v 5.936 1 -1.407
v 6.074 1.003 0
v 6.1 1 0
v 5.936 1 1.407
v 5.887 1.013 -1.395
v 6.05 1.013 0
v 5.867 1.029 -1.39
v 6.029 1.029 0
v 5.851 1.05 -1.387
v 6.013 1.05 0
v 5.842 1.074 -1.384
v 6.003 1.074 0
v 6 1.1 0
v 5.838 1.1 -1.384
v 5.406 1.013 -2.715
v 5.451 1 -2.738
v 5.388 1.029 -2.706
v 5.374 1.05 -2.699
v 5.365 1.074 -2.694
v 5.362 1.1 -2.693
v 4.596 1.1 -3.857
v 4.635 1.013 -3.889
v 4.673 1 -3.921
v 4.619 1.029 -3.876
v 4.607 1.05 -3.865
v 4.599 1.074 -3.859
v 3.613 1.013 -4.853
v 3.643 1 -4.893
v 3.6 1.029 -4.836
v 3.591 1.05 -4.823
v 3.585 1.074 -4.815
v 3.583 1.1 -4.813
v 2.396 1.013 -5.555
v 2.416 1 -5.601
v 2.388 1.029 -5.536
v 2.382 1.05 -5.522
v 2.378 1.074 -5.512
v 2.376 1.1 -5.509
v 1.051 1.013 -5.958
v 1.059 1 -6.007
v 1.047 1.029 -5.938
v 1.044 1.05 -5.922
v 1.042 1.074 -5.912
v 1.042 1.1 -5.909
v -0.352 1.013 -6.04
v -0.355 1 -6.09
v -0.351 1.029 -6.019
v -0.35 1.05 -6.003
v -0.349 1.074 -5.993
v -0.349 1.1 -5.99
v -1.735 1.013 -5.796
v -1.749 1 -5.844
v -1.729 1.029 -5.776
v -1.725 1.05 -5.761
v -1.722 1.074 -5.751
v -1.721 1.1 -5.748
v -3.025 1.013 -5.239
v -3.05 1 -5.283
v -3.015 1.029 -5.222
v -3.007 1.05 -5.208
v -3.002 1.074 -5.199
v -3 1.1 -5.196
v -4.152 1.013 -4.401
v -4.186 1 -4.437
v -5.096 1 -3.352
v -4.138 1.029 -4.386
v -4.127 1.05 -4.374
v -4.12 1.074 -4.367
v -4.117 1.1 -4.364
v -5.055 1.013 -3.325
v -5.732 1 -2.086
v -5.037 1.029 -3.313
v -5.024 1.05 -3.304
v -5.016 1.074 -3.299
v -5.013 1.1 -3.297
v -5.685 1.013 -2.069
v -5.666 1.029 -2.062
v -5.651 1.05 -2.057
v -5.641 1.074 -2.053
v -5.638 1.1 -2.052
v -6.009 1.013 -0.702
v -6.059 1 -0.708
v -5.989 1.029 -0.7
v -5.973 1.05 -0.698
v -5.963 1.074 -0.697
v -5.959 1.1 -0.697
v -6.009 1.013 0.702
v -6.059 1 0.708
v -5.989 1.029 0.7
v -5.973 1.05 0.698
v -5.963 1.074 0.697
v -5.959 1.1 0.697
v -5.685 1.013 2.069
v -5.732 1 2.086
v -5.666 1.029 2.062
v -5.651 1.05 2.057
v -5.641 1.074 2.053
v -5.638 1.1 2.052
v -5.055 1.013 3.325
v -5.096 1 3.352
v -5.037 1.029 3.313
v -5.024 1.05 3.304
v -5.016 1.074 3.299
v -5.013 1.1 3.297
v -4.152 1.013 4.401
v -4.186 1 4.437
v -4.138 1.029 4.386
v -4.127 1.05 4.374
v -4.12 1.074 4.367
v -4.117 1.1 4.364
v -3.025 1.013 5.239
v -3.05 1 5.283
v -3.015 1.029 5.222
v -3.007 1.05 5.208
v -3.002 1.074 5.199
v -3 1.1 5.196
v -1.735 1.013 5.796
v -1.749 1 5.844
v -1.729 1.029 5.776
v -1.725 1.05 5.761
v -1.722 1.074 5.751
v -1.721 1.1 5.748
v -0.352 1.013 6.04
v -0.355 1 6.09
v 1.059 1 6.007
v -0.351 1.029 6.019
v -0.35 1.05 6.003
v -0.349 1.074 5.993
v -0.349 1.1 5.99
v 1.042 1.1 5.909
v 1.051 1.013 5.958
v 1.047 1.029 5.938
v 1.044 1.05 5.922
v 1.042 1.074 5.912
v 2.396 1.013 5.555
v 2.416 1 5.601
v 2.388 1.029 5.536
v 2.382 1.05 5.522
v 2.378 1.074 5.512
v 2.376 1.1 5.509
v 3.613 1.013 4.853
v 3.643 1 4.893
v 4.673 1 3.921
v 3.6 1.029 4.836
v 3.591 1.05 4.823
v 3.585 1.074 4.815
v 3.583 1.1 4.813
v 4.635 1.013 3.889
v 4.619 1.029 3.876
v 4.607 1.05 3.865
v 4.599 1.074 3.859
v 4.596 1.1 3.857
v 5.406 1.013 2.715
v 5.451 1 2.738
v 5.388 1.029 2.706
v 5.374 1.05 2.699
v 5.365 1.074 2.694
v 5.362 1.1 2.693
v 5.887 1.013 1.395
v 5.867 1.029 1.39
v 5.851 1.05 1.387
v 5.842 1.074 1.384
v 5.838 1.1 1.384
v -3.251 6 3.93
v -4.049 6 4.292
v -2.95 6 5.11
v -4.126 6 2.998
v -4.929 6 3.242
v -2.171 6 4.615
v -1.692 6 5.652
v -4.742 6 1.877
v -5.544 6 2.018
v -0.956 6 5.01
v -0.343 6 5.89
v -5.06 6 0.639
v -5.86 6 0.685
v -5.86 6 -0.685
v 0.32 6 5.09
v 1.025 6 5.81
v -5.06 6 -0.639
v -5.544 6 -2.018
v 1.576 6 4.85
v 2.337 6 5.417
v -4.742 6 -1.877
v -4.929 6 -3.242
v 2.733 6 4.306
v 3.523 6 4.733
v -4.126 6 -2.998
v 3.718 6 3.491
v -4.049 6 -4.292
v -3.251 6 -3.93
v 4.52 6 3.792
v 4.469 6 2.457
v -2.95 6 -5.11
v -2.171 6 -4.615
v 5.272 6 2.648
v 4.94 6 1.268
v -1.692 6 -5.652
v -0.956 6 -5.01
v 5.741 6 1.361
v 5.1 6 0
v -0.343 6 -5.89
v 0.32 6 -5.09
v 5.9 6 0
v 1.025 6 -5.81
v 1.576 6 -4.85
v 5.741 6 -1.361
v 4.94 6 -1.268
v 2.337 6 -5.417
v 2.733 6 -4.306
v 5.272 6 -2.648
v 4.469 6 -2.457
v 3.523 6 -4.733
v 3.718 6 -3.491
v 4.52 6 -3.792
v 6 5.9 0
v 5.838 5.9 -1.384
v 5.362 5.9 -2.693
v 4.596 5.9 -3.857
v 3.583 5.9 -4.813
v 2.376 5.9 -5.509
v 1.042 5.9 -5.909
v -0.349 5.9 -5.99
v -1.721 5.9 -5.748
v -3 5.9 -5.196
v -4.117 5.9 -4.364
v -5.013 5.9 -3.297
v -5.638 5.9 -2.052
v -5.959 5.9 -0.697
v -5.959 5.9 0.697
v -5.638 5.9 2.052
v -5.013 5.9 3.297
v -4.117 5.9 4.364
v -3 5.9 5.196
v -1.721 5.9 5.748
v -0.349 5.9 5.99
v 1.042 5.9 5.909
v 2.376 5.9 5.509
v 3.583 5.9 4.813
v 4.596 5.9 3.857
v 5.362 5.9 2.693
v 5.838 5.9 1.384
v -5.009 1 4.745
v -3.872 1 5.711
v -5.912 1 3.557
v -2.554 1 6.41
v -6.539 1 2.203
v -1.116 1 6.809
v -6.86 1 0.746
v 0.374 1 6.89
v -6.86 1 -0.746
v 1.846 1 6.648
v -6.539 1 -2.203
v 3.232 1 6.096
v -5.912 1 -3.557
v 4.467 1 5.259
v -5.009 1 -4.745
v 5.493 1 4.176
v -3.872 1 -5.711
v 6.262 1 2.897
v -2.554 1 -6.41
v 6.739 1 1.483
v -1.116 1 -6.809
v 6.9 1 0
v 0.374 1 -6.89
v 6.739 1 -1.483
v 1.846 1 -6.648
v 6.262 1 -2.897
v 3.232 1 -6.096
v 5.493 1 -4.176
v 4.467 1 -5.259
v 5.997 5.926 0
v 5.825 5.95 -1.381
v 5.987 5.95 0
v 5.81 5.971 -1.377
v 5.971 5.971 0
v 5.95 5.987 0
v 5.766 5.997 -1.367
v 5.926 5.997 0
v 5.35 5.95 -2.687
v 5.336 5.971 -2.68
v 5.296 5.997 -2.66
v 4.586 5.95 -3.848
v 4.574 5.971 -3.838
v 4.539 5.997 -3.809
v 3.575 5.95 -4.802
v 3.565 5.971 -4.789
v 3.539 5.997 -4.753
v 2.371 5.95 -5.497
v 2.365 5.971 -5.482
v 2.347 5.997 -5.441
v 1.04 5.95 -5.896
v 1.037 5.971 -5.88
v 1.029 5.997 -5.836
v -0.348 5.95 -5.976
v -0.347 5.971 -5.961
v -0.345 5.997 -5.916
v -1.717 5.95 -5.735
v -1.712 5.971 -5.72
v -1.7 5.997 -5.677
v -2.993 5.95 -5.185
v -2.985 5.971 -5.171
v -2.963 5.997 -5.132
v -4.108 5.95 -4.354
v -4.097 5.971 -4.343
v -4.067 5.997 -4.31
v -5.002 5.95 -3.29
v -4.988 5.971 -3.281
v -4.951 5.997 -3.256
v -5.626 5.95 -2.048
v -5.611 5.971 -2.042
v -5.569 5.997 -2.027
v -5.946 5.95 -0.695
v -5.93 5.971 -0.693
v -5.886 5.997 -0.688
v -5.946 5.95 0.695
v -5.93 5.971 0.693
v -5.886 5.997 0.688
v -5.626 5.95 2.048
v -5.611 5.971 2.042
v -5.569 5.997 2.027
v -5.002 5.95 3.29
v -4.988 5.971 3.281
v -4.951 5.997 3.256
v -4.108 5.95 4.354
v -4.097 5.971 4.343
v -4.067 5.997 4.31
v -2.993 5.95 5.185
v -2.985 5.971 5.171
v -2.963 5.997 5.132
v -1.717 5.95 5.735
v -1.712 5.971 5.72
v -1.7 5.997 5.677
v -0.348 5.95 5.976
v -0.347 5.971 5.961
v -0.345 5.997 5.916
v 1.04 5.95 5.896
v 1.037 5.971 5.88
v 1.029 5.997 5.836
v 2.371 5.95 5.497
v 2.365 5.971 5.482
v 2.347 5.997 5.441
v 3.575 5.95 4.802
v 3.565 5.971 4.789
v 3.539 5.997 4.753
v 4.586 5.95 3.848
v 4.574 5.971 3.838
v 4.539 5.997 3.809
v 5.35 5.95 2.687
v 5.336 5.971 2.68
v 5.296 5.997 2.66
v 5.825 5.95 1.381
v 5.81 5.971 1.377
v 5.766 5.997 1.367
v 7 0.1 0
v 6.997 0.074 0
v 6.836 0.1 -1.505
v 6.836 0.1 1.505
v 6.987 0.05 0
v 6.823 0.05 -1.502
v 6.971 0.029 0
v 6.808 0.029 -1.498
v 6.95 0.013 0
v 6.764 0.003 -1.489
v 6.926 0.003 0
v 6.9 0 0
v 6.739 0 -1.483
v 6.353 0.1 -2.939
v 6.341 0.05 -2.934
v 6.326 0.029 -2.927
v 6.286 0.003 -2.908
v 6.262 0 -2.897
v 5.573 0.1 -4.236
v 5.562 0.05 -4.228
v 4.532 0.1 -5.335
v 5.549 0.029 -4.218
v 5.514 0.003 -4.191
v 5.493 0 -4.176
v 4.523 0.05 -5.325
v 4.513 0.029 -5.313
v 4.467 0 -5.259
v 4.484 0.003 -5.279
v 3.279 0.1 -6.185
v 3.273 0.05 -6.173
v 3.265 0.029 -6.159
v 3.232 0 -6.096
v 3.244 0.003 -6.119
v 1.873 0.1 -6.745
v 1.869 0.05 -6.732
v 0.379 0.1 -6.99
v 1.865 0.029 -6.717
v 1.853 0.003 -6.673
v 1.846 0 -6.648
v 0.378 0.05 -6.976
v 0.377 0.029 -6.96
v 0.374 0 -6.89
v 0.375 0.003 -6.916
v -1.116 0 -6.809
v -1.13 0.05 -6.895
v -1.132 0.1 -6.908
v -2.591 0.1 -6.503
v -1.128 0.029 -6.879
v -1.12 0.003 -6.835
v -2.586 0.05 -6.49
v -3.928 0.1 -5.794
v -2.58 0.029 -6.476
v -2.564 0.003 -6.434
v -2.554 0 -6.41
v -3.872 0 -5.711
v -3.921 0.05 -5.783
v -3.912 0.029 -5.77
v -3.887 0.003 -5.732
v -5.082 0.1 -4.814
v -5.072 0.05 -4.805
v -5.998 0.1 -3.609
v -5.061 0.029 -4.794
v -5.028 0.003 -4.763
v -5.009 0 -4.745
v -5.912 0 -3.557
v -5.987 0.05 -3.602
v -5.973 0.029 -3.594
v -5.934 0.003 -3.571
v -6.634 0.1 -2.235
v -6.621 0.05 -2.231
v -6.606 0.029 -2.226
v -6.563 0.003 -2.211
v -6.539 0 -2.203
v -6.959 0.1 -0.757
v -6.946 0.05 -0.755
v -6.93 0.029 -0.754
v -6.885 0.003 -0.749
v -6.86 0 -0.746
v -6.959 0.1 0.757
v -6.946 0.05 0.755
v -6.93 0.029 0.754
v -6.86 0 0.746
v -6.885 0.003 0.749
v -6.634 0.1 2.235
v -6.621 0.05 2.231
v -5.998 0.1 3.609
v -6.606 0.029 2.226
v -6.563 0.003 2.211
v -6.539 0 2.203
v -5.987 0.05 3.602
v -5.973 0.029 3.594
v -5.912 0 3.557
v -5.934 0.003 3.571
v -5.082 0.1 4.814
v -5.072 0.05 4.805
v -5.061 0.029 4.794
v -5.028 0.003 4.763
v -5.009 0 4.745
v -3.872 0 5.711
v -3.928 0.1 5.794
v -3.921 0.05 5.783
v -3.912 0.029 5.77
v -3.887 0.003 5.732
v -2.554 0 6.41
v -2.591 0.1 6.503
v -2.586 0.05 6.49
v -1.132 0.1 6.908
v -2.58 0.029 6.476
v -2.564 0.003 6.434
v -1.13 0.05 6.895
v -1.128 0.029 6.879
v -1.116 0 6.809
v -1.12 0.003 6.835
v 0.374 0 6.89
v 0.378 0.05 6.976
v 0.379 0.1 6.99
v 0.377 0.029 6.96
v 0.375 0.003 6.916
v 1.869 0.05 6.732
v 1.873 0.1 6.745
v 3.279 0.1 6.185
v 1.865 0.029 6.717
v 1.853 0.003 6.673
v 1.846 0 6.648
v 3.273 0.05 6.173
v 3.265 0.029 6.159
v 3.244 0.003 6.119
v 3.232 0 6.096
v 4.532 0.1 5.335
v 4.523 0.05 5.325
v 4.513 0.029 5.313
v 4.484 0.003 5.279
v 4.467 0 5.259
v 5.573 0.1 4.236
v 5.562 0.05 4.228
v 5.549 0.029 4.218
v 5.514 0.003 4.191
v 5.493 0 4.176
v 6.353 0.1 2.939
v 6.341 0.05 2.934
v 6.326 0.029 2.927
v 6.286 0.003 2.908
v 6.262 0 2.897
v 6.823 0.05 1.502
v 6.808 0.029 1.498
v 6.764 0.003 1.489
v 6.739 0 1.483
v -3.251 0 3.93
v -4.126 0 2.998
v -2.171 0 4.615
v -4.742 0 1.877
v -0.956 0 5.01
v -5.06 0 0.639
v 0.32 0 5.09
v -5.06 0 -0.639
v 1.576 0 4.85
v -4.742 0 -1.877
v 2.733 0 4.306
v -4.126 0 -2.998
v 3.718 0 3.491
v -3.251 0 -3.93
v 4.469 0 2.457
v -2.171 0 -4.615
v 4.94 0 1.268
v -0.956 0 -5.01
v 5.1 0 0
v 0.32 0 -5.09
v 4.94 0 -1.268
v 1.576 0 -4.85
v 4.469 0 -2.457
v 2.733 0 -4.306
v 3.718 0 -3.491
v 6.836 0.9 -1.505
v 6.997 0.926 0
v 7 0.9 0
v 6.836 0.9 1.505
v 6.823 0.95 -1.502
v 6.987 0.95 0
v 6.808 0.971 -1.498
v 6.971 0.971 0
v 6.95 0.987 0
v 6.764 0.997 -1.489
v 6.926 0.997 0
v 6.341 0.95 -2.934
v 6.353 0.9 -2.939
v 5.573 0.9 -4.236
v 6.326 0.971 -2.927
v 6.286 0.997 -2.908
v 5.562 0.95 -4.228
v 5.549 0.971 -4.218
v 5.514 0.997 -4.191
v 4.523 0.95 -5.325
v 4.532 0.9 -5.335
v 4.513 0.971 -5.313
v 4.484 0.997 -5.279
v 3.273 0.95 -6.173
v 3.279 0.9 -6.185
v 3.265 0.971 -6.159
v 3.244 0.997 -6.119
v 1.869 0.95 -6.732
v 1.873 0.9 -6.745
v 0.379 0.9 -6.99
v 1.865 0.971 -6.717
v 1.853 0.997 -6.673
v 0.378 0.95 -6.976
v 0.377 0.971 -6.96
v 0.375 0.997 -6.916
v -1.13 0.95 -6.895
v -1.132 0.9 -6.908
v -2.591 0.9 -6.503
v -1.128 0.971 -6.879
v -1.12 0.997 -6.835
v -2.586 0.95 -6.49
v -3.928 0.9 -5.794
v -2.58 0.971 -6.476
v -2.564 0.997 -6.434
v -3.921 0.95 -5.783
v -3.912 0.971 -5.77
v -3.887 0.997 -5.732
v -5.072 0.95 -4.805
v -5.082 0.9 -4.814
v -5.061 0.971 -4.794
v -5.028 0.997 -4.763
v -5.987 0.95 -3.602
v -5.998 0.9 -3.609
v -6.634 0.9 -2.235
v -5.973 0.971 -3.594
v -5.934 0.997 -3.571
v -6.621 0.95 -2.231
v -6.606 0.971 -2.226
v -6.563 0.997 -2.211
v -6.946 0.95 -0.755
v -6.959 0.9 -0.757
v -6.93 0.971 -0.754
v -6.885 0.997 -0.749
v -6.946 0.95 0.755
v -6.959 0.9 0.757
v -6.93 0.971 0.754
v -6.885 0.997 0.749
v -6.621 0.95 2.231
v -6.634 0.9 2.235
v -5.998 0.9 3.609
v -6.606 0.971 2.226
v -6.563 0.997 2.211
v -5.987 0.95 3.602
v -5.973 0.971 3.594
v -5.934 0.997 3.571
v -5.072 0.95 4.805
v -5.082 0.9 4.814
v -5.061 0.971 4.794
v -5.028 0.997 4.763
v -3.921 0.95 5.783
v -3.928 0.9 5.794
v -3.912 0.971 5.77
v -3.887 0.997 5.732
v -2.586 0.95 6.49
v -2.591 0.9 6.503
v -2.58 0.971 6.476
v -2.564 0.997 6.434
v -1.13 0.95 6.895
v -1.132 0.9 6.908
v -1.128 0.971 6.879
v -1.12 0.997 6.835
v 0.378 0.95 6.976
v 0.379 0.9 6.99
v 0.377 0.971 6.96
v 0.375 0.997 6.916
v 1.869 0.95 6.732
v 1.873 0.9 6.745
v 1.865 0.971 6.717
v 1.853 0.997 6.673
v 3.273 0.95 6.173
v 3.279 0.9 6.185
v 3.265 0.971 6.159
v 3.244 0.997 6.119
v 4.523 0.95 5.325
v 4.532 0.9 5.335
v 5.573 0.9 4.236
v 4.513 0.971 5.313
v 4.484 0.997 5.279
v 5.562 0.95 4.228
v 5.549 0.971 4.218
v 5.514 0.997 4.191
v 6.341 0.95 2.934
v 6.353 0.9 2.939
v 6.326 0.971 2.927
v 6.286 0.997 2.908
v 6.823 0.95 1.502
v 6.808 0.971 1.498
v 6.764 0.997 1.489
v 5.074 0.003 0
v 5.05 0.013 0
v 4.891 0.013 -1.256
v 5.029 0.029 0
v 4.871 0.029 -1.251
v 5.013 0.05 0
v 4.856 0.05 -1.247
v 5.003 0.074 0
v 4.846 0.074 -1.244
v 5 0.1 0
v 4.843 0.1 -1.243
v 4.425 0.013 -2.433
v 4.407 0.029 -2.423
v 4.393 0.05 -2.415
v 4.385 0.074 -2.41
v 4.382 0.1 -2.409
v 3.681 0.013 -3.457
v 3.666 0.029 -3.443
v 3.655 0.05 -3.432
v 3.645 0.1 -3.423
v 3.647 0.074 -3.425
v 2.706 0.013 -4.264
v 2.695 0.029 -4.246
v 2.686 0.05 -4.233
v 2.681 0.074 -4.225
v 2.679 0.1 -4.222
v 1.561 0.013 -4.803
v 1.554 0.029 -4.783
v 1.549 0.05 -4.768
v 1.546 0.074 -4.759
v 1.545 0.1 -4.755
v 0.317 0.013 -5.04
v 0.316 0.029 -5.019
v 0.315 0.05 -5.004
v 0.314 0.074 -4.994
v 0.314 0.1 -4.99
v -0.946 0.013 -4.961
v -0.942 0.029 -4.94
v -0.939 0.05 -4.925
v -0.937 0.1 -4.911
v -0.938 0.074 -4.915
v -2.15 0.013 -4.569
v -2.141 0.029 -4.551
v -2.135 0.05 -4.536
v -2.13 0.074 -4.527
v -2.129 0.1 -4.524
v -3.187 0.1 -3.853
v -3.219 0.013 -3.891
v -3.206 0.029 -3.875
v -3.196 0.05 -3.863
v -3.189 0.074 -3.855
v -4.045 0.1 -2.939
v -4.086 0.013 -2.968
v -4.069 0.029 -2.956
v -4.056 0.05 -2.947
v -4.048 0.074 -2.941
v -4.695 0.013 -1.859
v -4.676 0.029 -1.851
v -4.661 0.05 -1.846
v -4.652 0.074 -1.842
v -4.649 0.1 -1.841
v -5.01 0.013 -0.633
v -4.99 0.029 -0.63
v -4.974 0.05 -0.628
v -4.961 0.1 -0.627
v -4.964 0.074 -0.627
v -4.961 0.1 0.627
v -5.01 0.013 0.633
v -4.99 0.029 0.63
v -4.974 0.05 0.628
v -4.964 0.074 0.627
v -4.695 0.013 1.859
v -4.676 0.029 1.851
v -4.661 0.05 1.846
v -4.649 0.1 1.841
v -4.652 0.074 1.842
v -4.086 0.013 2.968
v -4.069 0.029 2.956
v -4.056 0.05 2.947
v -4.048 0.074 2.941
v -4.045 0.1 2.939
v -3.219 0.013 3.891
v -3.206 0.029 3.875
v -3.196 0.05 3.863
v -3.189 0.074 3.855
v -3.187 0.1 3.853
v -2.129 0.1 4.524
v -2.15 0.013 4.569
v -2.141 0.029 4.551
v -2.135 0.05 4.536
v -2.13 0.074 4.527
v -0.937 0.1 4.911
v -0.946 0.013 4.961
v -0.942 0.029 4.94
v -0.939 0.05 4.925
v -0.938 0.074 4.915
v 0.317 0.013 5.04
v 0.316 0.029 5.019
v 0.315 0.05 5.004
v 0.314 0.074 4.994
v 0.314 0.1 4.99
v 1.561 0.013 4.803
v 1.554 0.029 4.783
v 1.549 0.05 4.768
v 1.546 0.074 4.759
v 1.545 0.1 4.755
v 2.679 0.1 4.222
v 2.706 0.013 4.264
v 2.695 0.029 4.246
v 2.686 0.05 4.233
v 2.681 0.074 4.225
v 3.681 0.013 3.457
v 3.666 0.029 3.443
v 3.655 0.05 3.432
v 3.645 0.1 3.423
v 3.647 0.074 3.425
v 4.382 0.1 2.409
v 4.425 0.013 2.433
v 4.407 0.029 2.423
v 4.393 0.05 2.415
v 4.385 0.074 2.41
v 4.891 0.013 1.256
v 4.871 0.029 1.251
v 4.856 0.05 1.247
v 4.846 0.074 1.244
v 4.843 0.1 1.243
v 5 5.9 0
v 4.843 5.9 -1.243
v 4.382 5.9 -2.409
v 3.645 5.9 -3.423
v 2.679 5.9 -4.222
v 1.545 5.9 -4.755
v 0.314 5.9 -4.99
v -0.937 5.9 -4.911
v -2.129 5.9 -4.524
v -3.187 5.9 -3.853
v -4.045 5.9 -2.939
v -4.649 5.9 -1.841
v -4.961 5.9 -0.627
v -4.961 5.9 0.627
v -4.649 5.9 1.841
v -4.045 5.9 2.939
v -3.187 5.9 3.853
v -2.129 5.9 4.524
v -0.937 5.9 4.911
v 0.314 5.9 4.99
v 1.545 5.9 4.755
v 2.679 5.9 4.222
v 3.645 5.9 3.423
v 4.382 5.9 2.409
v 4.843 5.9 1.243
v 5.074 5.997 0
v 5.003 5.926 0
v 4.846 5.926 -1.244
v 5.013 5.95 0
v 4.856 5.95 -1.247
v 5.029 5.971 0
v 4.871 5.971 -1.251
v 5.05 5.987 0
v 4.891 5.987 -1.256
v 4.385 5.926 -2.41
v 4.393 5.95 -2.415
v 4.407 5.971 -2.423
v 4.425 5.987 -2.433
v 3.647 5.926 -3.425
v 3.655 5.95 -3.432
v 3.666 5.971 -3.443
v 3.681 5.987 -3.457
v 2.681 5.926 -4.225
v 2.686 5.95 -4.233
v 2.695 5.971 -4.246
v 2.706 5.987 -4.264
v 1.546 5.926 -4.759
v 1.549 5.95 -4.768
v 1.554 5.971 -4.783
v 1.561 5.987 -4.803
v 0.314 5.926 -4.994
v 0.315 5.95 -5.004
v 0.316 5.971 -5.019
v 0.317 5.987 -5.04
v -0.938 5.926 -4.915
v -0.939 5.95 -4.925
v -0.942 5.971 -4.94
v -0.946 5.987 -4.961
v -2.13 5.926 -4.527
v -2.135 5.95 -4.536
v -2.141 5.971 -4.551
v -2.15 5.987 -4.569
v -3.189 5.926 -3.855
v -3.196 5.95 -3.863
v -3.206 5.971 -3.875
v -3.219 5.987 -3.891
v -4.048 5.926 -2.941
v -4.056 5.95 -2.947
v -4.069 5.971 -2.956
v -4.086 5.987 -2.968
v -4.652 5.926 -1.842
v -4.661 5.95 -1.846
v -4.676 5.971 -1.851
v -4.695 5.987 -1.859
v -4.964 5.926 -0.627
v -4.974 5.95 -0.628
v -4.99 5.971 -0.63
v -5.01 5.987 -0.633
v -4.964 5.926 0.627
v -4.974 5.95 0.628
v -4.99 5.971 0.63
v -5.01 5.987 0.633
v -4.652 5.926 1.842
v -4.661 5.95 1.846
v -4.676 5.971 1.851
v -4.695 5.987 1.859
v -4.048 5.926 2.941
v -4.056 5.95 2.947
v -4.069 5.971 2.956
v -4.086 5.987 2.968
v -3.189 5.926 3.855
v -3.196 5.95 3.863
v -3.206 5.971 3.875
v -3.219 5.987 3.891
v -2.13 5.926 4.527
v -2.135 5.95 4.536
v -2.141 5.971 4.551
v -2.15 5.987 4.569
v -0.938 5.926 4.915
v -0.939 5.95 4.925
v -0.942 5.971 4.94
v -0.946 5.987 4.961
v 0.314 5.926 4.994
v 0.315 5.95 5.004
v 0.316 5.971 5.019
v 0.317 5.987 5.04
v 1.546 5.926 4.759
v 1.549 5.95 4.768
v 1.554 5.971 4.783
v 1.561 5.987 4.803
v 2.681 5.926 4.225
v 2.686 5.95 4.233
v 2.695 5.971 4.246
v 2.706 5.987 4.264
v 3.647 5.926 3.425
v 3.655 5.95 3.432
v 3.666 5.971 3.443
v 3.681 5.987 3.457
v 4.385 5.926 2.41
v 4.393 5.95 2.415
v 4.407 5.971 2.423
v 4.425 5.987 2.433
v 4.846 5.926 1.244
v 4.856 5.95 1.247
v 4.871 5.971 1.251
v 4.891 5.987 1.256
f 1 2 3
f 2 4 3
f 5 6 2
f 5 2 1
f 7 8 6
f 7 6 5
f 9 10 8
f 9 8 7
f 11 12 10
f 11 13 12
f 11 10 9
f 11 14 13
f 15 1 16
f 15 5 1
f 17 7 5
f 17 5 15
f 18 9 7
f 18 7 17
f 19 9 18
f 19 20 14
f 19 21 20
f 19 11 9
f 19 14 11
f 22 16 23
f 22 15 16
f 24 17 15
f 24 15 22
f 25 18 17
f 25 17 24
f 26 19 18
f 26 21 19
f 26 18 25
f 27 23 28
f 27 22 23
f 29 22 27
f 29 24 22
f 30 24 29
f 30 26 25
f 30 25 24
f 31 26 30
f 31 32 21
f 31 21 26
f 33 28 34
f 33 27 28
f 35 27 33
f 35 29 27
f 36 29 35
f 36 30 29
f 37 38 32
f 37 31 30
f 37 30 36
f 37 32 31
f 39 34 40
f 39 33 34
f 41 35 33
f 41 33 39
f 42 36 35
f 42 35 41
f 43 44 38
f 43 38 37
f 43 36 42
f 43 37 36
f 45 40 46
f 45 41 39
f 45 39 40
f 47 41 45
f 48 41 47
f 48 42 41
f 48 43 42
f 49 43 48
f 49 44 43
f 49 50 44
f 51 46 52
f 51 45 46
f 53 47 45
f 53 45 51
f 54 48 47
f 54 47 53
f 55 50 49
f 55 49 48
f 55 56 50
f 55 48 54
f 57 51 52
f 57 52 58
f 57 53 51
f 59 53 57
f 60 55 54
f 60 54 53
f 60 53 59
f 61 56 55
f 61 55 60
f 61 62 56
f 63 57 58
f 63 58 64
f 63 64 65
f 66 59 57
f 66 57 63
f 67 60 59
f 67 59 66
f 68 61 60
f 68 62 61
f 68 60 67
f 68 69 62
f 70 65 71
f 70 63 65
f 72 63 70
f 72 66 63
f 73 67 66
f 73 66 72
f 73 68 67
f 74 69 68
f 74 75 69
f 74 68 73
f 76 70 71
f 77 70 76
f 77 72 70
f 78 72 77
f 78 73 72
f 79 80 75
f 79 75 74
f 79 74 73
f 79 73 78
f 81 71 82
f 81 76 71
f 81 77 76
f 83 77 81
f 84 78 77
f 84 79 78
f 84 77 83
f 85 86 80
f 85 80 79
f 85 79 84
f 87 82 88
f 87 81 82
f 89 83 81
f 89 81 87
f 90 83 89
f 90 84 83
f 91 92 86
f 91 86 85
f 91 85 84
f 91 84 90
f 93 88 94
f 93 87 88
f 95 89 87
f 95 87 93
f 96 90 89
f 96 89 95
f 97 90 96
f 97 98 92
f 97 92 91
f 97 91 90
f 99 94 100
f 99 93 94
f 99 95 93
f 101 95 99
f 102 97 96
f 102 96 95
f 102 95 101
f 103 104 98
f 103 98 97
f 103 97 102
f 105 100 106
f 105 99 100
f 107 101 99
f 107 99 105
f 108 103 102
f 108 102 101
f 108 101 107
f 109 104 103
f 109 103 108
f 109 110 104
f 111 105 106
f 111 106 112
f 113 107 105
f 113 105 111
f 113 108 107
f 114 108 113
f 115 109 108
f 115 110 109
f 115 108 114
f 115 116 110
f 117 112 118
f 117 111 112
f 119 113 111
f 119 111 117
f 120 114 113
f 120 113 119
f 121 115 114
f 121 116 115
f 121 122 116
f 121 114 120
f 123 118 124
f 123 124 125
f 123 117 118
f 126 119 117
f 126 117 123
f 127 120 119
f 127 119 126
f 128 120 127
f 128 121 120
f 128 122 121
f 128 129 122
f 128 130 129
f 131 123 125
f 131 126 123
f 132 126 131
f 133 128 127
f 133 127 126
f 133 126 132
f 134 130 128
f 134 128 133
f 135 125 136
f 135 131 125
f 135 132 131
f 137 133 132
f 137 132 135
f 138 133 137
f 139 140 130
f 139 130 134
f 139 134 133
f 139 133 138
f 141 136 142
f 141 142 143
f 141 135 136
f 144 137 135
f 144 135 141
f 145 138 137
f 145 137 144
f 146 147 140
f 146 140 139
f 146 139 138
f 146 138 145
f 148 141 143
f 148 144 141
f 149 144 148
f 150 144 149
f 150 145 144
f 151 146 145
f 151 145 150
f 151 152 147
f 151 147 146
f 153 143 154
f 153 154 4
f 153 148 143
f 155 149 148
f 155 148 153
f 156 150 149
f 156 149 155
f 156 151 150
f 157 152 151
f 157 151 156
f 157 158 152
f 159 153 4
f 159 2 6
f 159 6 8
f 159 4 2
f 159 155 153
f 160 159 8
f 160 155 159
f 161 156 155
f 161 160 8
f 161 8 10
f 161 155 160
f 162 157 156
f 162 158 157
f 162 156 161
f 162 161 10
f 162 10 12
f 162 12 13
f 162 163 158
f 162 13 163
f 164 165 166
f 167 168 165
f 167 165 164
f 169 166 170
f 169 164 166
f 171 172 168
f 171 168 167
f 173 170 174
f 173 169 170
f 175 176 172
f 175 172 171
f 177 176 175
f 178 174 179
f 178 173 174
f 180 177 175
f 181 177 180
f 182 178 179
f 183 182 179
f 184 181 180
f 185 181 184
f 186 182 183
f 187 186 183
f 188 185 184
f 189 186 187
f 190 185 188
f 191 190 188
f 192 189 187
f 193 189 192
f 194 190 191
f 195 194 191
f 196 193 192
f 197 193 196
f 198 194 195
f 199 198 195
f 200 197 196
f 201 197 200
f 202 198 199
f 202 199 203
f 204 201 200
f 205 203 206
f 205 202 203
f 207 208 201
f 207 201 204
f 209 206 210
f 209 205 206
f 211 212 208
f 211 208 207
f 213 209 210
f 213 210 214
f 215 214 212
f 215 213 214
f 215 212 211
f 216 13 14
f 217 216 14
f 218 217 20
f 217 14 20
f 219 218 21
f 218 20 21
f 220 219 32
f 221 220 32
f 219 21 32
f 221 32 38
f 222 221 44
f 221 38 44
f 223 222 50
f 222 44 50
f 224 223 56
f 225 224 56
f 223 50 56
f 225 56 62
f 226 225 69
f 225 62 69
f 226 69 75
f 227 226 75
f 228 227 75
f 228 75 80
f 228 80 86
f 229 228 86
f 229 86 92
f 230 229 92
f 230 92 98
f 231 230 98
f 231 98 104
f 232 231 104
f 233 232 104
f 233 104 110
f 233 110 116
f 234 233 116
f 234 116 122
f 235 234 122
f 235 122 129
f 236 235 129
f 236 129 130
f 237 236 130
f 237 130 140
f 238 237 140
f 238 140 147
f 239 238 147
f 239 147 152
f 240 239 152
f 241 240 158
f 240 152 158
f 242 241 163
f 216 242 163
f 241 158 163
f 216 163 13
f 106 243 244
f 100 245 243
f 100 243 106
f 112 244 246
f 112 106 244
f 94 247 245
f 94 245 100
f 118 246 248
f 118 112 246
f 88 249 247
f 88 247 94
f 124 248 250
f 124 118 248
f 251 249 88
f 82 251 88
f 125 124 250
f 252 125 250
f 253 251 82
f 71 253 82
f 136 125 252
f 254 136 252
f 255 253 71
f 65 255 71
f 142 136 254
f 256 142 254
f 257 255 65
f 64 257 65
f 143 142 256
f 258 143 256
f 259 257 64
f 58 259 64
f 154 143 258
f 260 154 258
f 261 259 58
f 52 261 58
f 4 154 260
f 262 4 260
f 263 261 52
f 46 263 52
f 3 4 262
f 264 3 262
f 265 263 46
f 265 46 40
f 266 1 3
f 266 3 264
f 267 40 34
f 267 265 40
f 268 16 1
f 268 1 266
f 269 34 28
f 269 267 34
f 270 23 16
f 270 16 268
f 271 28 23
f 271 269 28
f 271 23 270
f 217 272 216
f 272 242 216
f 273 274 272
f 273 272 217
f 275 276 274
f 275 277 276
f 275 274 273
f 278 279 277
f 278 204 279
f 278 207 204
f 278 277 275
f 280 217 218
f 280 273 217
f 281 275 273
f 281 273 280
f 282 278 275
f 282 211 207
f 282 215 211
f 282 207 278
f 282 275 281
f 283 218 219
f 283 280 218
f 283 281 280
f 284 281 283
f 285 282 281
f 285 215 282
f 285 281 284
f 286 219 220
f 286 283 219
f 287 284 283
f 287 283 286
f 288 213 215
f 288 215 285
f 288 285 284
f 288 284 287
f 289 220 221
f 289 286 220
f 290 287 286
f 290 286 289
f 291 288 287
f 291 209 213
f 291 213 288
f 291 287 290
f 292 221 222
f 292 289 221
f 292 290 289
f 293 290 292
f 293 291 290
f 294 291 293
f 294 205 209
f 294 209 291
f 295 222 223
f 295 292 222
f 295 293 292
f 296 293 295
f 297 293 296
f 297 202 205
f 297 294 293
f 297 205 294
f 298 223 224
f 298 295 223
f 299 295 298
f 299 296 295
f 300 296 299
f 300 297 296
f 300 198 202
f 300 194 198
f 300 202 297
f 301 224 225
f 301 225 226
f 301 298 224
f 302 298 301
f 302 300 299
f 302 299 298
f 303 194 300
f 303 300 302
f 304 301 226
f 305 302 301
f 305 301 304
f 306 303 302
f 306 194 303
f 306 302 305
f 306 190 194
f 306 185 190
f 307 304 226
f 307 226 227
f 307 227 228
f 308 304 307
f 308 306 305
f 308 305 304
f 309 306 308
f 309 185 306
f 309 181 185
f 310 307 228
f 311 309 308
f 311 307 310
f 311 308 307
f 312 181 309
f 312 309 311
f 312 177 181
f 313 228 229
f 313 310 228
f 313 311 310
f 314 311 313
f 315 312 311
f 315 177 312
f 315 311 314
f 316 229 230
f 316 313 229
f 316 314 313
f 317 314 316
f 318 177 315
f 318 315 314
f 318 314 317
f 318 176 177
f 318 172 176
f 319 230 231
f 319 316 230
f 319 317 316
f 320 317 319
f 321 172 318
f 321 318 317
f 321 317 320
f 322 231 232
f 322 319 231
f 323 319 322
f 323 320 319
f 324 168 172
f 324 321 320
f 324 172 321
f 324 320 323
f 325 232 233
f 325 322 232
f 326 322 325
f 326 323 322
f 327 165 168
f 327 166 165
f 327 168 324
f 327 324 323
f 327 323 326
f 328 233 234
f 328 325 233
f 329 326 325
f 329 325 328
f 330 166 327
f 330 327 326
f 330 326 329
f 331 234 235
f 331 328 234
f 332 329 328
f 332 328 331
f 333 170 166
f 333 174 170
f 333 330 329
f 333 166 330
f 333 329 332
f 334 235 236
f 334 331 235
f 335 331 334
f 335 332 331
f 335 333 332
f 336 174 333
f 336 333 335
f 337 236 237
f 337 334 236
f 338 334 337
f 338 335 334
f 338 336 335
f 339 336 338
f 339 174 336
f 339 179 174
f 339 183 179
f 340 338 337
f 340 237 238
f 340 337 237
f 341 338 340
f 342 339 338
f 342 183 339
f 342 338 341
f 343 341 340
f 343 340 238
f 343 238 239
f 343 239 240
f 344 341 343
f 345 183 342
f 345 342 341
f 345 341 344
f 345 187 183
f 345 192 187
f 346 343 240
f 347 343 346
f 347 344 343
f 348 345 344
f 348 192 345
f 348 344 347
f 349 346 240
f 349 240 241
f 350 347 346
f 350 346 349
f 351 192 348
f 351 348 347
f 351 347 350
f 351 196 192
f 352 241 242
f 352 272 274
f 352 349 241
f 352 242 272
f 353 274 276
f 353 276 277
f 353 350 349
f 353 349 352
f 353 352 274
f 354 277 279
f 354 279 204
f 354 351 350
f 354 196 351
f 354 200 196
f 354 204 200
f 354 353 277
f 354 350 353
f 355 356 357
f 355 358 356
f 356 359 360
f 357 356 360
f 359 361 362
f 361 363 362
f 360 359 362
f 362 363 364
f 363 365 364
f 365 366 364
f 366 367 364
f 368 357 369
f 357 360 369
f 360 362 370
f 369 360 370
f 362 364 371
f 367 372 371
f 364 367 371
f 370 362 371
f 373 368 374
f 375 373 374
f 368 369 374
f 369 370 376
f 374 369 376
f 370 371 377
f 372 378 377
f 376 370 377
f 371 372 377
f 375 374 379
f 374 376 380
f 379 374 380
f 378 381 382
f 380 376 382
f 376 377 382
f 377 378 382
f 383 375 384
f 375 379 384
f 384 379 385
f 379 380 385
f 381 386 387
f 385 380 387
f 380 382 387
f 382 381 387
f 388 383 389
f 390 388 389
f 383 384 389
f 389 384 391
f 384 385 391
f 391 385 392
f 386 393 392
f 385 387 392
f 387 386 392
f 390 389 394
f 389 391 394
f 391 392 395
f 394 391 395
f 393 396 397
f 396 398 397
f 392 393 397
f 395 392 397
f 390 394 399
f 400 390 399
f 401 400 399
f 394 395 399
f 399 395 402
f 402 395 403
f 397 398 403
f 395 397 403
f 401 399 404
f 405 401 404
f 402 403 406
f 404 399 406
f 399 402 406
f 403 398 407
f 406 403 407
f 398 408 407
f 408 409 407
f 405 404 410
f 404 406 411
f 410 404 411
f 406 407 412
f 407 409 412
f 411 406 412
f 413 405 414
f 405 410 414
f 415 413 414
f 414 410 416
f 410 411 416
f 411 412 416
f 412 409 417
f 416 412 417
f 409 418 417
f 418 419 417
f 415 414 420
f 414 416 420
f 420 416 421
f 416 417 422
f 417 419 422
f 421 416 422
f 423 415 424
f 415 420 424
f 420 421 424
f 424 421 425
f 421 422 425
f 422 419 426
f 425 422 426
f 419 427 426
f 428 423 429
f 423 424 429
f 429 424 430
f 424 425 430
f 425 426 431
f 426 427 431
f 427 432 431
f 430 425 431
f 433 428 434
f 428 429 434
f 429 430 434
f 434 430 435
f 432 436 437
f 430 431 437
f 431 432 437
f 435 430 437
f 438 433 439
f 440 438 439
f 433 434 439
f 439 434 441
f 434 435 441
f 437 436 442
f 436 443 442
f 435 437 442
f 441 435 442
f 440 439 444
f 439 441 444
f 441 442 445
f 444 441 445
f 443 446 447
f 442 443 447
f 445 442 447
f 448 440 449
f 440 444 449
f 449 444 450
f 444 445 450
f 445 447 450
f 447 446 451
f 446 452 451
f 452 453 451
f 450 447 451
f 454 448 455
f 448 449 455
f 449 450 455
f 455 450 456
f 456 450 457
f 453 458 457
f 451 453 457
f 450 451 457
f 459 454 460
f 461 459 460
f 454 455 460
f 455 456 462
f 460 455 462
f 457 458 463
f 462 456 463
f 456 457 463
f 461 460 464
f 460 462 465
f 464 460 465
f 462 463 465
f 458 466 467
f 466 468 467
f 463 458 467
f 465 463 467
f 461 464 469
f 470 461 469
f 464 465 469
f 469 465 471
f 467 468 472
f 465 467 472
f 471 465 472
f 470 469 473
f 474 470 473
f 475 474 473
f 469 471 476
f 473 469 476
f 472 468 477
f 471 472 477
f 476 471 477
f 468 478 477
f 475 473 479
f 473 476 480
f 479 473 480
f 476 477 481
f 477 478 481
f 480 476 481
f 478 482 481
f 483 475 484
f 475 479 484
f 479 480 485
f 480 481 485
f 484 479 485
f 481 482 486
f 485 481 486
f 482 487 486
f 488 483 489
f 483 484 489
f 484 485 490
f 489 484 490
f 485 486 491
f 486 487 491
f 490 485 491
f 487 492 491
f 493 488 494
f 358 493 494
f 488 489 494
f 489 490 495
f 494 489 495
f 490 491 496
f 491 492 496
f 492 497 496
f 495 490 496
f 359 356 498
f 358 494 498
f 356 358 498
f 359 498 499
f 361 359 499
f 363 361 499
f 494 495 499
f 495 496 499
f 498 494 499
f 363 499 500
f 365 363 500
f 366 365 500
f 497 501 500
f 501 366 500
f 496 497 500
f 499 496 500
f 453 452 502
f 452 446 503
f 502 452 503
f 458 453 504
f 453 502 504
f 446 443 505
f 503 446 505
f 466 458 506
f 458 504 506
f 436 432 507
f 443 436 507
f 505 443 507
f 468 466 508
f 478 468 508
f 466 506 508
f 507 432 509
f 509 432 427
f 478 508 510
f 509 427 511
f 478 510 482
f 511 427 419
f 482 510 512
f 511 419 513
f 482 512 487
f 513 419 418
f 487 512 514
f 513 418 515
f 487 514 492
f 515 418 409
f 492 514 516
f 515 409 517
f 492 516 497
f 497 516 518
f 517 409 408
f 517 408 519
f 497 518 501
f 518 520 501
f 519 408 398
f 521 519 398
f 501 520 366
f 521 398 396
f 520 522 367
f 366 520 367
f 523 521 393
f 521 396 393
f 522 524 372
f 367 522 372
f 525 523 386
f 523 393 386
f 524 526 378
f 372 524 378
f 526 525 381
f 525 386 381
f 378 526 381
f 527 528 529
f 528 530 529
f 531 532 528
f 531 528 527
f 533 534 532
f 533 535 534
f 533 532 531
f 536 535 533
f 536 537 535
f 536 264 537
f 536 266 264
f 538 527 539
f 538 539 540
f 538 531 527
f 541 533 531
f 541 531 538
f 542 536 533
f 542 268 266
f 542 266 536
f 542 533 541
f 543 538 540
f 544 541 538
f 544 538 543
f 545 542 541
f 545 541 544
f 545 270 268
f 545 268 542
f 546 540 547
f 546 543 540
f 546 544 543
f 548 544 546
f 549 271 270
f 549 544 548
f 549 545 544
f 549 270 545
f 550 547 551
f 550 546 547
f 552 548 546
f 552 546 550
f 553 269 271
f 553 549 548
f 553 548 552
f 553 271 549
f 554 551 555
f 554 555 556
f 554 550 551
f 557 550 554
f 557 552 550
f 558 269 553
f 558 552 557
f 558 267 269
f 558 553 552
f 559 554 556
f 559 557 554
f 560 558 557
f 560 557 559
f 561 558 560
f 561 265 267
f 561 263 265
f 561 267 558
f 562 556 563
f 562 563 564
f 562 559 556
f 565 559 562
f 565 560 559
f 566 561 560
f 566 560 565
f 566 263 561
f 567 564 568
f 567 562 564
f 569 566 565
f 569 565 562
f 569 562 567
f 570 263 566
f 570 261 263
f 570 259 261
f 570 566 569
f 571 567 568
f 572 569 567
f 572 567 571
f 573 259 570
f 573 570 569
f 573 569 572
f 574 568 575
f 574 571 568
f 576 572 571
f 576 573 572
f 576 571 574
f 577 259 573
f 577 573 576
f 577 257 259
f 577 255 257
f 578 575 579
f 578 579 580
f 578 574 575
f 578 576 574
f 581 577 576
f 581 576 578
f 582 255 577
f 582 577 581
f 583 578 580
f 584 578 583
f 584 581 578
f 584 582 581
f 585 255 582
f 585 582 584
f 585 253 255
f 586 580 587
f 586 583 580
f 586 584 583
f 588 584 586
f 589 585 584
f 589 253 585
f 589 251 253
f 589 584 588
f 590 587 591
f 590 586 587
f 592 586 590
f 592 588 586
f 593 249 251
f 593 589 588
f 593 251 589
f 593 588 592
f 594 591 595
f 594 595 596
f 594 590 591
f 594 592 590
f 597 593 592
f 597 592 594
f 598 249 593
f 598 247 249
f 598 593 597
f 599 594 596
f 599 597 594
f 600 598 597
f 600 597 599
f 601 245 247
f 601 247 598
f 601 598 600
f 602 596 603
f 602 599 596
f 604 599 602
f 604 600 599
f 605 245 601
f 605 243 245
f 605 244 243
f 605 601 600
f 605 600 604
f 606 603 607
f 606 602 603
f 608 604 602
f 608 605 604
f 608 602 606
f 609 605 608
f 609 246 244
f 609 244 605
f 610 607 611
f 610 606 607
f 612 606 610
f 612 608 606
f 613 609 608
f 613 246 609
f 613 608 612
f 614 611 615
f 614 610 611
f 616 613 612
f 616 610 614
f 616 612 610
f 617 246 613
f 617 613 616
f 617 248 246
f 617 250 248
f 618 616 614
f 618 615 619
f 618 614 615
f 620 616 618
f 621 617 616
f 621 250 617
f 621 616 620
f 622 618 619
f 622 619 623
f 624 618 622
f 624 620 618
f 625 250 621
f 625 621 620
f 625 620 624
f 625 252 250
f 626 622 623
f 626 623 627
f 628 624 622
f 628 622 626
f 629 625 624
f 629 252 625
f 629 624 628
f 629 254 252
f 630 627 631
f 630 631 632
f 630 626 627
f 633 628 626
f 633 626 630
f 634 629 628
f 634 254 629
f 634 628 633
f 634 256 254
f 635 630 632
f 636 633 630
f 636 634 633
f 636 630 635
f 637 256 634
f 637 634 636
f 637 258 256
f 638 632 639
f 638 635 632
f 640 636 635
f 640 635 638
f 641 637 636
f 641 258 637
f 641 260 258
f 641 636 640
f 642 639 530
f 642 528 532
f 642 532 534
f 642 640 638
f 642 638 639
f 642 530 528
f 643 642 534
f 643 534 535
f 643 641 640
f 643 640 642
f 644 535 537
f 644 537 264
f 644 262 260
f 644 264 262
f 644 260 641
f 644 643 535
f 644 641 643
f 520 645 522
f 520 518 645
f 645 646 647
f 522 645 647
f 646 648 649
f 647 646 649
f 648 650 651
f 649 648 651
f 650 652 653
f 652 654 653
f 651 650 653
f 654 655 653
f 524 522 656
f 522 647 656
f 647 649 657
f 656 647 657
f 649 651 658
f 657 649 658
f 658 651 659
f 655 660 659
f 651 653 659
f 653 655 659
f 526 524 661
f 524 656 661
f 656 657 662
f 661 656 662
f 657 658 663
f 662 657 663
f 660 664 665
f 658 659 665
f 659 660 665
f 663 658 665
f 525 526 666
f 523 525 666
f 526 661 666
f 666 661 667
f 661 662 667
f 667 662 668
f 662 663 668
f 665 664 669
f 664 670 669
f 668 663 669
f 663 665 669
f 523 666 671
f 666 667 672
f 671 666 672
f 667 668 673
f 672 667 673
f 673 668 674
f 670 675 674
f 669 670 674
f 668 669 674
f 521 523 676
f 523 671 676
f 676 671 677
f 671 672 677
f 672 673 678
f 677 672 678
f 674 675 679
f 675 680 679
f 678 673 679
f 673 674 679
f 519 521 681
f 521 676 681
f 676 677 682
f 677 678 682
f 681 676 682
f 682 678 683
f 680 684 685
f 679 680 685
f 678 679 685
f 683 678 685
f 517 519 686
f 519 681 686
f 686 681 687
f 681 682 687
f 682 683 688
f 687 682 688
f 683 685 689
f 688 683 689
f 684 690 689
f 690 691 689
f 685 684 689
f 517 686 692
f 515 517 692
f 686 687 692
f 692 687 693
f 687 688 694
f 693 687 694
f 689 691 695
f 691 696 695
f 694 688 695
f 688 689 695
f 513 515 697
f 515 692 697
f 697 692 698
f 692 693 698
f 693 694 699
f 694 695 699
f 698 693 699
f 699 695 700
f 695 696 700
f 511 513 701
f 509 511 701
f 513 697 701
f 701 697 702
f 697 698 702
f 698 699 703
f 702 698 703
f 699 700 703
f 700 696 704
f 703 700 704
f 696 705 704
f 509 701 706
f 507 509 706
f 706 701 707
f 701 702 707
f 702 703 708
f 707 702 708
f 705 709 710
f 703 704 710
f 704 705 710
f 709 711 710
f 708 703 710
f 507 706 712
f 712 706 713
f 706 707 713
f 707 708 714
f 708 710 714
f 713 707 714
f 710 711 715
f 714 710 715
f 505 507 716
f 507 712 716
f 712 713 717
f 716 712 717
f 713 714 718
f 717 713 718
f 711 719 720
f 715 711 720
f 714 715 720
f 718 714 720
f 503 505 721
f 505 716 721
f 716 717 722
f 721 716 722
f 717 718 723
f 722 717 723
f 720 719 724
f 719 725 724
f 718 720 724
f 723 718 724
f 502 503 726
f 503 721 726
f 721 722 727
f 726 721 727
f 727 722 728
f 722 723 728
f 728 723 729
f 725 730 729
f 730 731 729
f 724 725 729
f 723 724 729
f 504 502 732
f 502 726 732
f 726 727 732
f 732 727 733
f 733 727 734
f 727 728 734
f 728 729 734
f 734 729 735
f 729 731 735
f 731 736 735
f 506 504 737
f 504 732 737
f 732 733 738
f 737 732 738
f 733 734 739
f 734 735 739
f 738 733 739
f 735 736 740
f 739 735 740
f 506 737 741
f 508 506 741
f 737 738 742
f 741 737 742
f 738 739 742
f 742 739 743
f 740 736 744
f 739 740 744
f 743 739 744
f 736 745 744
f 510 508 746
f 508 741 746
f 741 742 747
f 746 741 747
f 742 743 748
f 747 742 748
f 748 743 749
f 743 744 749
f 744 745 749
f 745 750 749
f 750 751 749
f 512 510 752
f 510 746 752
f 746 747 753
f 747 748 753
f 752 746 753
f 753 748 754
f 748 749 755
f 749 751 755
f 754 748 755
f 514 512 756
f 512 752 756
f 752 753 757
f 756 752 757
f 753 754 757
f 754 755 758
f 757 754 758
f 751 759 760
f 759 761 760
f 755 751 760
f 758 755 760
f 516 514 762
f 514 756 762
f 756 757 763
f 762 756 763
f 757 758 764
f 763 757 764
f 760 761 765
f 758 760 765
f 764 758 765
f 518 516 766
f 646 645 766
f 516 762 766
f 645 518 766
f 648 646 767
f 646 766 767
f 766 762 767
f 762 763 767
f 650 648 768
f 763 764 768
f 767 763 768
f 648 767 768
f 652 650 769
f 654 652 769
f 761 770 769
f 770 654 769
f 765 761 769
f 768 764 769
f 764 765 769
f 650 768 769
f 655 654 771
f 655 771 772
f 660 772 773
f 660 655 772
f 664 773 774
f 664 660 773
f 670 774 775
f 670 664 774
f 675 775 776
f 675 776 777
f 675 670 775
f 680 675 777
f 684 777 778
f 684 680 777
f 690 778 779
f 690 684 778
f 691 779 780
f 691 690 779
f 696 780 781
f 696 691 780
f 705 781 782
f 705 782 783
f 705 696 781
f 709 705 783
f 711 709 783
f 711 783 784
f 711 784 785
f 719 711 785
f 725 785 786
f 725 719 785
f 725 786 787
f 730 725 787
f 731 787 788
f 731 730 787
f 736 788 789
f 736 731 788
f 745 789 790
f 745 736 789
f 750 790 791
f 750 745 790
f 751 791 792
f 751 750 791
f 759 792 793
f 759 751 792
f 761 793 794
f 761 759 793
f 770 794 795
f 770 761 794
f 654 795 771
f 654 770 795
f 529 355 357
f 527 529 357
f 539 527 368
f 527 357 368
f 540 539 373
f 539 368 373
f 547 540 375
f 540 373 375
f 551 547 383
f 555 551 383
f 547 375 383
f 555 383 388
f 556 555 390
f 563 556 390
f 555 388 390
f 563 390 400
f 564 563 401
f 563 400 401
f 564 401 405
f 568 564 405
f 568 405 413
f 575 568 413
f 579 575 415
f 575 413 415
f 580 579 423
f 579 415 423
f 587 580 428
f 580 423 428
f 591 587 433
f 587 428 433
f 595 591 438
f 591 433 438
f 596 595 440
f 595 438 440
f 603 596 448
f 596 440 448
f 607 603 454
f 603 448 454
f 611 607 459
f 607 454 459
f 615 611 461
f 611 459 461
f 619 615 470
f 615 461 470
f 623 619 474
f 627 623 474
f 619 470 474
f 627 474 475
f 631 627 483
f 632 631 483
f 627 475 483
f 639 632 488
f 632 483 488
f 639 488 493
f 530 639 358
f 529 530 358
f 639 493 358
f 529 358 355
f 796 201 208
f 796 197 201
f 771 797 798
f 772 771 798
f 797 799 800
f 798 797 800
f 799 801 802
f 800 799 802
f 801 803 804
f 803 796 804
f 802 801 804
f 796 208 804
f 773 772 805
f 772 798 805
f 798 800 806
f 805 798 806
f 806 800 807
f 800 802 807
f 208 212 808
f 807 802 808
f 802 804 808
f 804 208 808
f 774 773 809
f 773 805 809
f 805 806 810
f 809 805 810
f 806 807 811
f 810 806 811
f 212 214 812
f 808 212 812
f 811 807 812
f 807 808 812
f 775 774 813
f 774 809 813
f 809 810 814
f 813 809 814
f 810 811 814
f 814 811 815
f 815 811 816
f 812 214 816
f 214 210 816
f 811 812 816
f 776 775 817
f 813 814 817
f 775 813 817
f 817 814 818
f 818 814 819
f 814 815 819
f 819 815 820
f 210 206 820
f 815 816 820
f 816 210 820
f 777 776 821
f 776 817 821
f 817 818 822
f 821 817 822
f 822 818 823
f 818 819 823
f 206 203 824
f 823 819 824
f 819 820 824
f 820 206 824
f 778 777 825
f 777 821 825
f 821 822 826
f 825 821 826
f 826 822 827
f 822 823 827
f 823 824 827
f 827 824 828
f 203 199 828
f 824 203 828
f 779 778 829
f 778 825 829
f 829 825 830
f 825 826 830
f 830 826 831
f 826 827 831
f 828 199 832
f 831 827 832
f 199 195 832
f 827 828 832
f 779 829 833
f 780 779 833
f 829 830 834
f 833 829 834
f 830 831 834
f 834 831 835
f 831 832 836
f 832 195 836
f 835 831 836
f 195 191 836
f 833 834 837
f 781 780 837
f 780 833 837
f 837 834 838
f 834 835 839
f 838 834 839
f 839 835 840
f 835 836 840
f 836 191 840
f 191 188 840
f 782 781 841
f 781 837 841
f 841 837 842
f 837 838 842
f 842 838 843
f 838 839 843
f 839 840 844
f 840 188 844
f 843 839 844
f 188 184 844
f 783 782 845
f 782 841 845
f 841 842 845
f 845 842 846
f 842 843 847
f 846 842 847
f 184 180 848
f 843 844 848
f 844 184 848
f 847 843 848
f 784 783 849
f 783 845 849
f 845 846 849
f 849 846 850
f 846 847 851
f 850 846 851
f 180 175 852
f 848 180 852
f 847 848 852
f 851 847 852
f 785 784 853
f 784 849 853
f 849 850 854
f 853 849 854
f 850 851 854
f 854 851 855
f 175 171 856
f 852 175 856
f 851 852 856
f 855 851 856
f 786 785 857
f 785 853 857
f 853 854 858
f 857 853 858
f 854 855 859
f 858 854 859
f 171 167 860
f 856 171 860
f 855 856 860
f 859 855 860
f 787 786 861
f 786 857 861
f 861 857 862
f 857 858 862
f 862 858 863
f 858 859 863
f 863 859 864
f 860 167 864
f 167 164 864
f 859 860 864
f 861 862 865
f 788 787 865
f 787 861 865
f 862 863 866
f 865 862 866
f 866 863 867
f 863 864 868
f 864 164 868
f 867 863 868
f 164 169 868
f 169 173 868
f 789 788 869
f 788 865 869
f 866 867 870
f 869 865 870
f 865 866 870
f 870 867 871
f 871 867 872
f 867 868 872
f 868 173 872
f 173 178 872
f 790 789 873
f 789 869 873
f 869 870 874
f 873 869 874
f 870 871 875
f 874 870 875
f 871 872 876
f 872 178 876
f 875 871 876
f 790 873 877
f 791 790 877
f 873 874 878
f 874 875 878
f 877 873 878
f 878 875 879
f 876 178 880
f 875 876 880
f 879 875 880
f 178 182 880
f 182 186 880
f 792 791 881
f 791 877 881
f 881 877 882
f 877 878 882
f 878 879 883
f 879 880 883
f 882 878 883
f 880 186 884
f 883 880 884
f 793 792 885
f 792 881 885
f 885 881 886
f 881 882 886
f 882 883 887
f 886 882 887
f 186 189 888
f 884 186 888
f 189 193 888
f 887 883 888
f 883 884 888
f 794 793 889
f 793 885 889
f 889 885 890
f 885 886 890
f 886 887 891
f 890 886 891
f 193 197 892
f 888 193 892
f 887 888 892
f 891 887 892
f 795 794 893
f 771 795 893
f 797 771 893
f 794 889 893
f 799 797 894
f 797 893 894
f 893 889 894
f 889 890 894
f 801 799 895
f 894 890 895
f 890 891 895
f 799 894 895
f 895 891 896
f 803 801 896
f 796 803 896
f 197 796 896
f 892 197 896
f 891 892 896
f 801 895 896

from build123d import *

# Parameters (mm, degrees)
SKETCH3_R           = 6
SKETCH3_R_2         = 5
BOSS_EXTRUDE1_DEPTH = 6
SKETCH4_R           = 7
SKETCH4_R_2         = 6
BOSS_EXTRUDE2_DEPTH = 1
FILLET1_R           = 0.1


with BuildPart() as part:
    # Sketch3 → Boss-Extrude1 (new body)
    with BuildSketch(Plane(origin=(0, 0, 0), x_dir=(1, 0, 0), z_dir=(0, 1, 0))):
        Circle(SKETCH3_R)
        Circle(SKETCH3_R_2, mode=Mode.SUBTRACT)
    extrude(amount=BOSS_EXTRUDE1_DEPTH)

    # Sketch4 → Boss-Extrude2 (add)
    with BuildSketch(Plane(origin=(0, 0, 0), x_dir=(1, 0, 0), z_dir=(0, 1, 0))):
        Circle(SKETCH4_R)
        Circle(SKETCH4_R_2, mode=Mode.SUBTRACT)
    extrude(amount=BOSS_EXTRUDE2_DEPTH)

    # Fillet1
    fillet1_edges = [part.edges().sort_by_distance(p)[0] for p in [
        (-7, 0, 0),
        (-6, 1, 0),
        (-6, 6, 0),
        (-5, 0, 0),
        (-5, 6, 0),
        (-7, 1, 0),
    ]]
    fillet(fillet1_edges, radius=FILLET1_R)


solid = part.part
